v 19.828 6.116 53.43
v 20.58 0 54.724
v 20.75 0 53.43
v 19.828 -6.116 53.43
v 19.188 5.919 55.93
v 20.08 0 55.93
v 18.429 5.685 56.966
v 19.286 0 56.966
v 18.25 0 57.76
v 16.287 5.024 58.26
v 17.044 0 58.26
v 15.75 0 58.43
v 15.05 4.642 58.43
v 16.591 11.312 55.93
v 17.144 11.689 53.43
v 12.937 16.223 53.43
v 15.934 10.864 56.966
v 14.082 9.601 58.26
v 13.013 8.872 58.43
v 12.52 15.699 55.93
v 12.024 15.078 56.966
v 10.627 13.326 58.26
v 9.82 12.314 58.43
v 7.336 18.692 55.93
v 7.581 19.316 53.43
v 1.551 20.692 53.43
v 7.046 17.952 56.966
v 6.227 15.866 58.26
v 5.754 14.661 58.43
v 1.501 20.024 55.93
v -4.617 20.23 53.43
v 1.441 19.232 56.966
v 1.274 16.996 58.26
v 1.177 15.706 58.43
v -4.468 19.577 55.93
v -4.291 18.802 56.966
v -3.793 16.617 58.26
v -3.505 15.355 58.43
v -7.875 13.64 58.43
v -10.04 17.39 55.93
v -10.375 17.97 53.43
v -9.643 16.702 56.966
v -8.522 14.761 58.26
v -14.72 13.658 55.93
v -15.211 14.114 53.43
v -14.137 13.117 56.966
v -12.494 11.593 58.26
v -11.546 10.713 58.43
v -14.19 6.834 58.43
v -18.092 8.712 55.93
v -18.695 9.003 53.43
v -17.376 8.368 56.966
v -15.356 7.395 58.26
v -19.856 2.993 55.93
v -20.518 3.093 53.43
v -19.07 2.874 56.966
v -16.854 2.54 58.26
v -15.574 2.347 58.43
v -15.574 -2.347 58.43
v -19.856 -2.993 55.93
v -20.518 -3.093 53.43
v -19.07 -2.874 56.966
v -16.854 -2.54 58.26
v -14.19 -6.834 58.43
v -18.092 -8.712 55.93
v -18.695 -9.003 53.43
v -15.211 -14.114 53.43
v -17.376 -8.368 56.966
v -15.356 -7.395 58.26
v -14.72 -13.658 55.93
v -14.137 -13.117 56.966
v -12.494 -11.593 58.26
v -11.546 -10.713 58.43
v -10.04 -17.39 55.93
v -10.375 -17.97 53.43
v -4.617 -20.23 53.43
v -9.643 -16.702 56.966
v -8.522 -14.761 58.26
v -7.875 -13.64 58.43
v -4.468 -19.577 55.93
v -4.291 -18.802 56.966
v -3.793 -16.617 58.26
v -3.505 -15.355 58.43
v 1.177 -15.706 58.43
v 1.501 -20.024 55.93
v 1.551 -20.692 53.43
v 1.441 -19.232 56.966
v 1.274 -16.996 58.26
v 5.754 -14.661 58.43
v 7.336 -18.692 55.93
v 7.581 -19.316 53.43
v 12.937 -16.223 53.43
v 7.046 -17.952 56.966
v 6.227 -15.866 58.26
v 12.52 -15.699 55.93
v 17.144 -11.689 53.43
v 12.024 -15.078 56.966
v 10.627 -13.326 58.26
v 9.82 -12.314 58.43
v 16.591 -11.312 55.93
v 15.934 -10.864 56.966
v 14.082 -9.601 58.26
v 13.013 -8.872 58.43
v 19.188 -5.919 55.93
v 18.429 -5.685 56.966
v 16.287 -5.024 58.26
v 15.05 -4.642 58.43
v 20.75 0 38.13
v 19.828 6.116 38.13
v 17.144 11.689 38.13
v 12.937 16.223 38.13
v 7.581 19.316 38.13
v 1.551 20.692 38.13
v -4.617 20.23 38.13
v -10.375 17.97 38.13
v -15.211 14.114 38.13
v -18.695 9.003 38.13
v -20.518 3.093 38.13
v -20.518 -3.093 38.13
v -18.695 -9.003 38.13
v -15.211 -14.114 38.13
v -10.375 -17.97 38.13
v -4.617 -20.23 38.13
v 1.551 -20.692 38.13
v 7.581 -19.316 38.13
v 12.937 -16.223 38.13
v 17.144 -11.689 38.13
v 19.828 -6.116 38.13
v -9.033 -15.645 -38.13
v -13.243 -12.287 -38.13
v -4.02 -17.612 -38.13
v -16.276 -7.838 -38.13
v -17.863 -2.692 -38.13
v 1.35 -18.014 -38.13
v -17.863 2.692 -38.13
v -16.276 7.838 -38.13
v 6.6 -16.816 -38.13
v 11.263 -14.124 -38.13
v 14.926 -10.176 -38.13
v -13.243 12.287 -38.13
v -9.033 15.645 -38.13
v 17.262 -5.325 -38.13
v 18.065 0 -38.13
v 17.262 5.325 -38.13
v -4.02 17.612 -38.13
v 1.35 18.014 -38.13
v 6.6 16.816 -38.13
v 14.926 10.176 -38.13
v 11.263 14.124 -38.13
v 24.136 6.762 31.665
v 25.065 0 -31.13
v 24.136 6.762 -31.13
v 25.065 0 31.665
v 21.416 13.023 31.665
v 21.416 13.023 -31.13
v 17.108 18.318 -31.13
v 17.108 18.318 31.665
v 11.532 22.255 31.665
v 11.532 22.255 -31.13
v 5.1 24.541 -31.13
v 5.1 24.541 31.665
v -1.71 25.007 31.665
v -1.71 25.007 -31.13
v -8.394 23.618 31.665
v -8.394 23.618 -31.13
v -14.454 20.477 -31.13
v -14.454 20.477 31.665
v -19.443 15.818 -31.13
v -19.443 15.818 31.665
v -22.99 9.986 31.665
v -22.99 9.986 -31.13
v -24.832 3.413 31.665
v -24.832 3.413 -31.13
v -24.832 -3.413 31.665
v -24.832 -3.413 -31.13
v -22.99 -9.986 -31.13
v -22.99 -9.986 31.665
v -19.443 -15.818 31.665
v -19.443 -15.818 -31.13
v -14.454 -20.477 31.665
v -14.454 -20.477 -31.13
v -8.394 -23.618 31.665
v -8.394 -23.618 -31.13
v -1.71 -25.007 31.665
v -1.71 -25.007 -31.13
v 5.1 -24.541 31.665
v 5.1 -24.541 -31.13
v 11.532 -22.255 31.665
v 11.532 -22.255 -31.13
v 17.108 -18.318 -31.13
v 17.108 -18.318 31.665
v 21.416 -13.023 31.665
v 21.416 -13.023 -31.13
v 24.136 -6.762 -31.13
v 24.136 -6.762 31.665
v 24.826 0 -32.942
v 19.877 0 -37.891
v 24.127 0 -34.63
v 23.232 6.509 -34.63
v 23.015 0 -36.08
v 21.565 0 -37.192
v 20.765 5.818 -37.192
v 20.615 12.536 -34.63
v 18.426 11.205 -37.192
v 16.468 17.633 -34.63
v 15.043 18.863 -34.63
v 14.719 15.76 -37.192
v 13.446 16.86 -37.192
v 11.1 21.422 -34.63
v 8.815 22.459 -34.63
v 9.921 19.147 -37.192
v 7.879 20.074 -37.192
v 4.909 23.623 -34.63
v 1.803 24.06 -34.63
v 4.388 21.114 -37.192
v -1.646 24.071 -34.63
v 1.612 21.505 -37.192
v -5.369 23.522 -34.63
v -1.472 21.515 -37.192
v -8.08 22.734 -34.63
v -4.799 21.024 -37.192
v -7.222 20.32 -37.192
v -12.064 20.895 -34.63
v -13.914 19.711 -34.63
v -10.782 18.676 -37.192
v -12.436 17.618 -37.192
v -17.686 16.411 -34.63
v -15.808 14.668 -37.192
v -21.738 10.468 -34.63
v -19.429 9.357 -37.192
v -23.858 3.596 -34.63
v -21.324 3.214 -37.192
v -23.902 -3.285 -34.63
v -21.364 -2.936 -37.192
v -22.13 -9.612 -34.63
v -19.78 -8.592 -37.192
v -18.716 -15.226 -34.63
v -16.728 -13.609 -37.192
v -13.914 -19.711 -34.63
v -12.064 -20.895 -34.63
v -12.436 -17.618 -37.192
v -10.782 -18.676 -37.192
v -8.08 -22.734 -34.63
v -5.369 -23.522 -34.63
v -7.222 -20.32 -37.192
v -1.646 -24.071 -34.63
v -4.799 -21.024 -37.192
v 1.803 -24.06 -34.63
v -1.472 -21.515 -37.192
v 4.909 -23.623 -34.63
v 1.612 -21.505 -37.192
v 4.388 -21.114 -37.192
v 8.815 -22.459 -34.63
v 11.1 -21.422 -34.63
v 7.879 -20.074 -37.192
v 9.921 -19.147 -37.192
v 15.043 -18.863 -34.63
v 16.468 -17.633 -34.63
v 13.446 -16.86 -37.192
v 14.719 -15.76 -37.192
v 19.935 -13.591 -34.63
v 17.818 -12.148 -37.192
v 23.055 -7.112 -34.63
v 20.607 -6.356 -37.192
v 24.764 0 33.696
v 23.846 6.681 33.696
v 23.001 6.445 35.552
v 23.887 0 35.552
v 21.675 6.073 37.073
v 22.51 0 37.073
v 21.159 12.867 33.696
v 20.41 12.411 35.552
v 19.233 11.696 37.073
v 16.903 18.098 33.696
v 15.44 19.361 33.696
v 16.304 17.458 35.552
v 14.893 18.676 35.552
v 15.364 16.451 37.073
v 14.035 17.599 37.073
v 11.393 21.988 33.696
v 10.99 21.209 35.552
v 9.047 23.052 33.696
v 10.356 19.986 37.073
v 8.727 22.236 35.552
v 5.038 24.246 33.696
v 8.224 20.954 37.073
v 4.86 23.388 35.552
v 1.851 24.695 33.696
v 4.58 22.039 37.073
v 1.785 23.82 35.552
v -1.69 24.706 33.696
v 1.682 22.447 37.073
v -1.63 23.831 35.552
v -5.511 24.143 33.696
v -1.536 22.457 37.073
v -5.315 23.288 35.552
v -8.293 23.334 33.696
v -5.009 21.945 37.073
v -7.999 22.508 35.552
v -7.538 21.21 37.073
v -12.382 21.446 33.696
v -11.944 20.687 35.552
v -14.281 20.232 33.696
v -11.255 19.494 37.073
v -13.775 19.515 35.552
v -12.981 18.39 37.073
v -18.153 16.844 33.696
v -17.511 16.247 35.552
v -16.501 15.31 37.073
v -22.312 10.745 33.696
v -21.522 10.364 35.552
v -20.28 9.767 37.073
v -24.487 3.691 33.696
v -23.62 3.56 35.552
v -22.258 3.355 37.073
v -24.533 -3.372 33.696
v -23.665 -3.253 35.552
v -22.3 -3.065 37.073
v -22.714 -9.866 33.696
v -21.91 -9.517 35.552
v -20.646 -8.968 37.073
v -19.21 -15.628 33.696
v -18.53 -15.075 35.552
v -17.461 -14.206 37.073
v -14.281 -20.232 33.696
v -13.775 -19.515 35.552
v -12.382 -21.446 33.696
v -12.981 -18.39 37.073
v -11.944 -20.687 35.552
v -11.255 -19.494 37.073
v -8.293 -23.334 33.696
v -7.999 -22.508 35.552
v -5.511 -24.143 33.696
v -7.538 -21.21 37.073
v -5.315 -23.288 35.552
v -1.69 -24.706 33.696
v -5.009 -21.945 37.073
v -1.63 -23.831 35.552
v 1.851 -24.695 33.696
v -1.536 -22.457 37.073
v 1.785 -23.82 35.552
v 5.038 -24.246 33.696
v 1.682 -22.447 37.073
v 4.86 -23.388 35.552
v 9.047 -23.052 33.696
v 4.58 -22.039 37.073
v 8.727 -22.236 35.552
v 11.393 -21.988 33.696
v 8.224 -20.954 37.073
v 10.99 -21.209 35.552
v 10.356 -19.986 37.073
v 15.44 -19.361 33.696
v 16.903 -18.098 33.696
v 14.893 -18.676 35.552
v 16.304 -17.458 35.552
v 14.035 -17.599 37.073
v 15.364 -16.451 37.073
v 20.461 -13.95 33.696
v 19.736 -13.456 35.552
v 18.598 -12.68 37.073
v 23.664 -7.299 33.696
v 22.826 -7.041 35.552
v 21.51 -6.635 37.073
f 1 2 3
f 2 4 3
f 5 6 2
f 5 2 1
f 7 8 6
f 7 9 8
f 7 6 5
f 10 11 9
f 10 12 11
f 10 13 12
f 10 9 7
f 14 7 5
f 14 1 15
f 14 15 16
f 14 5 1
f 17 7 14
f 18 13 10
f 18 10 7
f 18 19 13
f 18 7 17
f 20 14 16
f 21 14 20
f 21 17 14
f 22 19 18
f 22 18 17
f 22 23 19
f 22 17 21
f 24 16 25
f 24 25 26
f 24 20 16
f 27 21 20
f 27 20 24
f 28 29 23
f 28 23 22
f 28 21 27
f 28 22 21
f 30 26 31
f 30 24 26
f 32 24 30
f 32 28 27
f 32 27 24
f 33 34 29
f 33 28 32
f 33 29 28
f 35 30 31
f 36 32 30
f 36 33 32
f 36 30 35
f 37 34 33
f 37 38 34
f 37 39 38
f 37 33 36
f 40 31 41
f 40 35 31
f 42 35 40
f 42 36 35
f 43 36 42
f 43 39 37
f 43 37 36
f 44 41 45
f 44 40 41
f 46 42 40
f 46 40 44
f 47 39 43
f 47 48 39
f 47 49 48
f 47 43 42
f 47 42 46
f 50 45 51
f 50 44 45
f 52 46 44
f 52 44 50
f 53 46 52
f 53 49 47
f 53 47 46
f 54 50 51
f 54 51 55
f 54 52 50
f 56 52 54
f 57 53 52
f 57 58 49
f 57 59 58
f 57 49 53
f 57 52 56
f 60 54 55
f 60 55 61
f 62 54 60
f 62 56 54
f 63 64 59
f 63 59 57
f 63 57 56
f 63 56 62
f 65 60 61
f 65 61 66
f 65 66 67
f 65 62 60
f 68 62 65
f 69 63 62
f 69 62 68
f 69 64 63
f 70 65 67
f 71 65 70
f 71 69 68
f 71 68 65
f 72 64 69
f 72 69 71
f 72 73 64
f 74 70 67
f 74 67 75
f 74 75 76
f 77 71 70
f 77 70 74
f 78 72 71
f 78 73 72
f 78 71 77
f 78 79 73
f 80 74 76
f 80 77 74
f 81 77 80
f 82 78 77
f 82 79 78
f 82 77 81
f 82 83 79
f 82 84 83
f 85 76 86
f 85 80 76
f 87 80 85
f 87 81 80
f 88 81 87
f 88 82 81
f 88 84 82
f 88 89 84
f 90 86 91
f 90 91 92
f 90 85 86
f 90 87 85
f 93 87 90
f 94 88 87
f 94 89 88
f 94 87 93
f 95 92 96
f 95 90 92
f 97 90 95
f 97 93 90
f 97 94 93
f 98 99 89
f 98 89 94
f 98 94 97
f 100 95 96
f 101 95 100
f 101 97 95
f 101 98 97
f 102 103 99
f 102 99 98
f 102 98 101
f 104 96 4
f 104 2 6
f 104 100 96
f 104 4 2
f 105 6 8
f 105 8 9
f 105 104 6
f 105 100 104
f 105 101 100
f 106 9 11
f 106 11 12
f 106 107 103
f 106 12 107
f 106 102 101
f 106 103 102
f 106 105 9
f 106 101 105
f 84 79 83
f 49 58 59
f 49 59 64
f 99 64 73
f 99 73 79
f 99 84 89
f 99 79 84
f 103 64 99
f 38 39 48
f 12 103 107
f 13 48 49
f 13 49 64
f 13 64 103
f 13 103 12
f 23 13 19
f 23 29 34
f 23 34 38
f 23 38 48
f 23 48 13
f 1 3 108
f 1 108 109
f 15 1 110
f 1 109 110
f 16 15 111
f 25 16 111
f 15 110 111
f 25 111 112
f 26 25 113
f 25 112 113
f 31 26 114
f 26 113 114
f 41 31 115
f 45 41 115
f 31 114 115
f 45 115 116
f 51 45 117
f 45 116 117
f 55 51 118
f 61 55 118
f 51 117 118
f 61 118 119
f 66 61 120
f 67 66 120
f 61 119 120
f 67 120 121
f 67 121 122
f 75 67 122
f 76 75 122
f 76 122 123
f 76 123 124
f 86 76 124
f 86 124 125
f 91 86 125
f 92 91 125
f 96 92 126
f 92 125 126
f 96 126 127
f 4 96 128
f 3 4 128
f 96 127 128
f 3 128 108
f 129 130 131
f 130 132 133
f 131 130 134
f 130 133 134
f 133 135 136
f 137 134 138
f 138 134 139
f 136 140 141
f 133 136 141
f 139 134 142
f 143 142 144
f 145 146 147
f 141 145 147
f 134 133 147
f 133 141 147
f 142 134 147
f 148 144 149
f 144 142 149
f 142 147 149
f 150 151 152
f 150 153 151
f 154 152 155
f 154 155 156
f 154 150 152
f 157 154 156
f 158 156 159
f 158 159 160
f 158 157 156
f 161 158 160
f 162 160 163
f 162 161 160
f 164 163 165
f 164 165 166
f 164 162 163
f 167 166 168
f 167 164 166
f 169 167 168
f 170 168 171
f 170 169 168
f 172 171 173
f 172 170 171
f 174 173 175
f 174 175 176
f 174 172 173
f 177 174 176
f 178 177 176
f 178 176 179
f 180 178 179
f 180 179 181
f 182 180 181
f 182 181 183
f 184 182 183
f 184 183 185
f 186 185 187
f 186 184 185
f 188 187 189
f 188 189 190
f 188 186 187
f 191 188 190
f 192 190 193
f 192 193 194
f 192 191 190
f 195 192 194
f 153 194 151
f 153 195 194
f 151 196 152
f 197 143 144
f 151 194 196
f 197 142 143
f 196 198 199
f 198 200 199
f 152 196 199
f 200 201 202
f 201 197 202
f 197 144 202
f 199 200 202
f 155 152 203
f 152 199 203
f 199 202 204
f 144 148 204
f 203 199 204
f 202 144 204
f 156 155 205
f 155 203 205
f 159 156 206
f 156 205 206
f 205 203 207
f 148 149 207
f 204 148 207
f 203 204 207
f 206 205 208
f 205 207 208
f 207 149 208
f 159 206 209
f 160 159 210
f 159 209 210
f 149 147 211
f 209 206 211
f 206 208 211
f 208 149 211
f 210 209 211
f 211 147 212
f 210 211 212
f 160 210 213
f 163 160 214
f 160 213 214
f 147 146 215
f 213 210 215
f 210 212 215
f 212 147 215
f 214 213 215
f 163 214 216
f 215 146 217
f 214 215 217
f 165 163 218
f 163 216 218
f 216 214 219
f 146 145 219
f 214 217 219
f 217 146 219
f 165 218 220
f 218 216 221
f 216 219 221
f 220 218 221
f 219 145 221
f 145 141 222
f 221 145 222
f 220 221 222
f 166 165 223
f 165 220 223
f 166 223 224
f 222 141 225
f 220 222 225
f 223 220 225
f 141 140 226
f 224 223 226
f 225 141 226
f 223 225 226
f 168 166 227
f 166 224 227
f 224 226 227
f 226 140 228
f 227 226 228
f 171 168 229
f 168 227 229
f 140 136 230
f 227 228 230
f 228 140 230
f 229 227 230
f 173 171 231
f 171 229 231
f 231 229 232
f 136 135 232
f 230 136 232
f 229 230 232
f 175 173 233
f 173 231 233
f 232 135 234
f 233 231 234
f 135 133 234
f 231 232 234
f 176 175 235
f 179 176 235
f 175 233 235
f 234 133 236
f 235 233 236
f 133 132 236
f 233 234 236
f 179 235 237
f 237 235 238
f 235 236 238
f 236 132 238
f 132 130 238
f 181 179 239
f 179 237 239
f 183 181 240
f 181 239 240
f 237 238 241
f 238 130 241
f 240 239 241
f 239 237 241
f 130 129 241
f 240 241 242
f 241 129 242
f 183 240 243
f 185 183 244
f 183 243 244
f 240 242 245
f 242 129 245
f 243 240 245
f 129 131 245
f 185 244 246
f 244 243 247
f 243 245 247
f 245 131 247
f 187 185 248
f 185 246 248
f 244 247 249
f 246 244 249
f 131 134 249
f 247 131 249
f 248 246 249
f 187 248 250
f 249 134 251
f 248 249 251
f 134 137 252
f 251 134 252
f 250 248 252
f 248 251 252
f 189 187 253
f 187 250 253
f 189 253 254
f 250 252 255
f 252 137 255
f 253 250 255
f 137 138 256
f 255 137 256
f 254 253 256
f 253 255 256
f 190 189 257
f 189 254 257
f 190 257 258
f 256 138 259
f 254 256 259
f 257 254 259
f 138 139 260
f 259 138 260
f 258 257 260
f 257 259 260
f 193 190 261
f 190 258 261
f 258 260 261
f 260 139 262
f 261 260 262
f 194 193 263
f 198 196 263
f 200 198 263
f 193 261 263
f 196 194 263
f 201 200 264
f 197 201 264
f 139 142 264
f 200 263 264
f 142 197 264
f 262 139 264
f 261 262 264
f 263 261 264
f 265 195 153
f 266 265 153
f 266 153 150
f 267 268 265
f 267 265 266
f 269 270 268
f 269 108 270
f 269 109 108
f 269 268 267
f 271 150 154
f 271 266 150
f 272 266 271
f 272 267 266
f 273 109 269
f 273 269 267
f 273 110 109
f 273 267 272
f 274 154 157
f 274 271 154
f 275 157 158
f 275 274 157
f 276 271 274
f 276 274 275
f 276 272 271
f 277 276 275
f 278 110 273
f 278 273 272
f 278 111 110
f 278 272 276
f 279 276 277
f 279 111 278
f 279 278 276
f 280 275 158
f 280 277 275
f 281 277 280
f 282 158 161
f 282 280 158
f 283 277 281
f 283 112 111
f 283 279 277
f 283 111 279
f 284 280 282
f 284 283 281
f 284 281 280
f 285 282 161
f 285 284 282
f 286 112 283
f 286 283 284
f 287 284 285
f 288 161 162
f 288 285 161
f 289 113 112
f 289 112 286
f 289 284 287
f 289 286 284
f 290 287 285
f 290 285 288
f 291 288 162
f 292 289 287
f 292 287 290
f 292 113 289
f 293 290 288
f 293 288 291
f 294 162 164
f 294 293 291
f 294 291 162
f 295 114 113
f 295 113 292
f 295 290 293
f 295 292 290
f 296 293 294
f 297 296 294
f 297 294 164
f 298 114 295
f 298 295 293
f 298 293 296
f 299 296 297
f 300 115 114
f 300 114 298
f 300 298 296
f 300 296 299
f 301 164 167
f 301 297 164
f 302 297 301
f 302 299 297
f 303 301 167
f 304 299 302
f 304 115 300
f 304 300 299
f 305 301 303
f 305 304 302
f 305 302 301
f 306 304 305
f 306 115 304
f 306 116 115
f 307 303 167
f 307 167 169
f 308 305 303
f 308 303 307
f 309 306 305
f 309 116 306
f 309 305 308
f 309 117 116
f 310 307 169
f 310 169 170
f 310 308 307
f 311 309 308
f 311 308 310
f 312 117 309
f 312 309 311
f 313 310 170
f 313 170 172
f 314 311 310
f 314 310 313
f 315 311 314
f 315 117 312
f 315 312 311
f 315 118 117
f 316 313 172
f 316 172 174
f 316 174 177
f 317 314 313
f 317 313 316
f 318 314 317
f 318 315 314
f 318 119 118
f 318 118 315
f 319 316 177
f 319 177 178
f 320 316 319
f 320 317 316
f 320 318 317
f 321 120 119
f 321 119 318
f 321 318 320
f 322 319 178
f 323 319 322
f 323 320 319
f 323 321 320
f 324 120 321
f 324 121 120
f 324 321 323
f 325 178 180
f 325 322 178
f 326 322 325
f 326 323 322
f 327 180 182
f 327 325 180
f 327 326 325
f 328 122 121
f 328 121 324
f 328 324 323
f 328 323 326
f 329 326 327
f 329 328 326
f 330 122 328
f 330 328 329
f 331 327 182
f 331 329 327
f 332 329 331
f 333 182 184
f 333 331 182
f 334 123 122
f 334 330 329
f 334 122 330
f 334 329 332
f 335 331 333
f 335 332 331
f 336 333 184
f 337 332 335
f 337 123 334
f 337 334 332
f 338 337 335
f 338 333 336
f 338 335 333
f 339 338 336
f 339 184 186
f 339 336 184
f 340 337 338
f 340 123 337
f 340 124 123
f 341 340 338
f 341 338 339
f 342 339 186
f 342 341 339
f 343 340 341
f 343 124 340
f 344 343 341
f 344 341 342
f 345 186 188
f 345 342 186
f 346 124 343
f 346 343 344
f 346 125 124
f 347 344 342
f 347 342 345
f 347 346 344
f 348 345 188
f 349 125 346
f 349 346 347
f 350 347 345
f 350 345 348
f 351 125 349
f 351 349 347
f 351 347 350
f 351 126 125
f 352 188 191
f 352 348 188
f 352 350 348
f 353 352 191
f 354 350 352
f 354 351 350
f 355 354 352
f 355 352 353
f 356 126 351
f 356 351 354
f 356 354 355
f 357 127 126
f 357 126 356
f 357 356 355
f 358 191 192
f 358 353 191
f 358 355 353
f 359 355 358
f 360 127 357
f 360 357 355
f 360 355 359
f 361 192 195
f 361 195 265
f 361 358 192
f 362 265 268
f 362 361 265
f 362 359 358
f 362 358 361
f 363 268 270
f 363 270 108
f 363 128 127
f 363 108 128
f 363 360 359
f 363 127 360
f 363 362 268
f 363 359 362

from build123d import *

# Parameters (mm, degrees)
F0_R     = 25.065
F1_DEPTH = 38.13
F2_R     = 20.75
F3_DEPTH = 20.3
F5_R     = 5


# Not quite as in the source:
# - a fillet or chamfer that OpenCascade refuses, or shapes differently, is made with other operations: its cross-section is extruded or revolved along the edge and cut away or added


with BuildPart() as f1:
    # F0 (on Top) → F1 (new body, symmetric)
    with BuildSketch(Plane.XY):
        Circle(F0_R)
    extrude(amount=F1_DEPTH, both=True)

    # F2 (on face) → F3 (join)
    with BuildSketch(Plane.XY.offset(38.13)):
        Circle(F2_R)
    extrude(amount=F3_DEPTH)

    # F4: fillet of radius 7 on 2 edges, made by hand

    # F4_s1 → F4_t2 (revolve, cut)
    with BuildSketch(Plane.XZ):
        with BuildLine():
            ThreePointArc((25.065, 31.6654215141), (23.8871559581, 35.5516150245), (20.75, 38.13))
            Line((20.75, 38.13), (25.065, 38.13))
            Line((25.065, 38.13), (25.065, 31.6654215141))
        make_face()
    revolve(axis=Axis((0, 0, 38.13), (0, 0, 1)), mode=Mode.SUBTRACT)

    # F4_s3 → F4_t4 (revolve, cut)
    with BuildSketch(Plane.XZ):
        with BuildLine():
            ThreePointArc((25.065, -31.13), (23.0147474683, -36.0797474683), (18.065, -38.13))
            Line((18.065, -38.13), (25.065, -38.13))
            Line((25.065, -38.13), (25.065, -31.13))
        make_face()
    revolve(axis=Axis((0, 0, -38.13), (0, 0, 1)), mode=Mode.SUBTRACT)

    # F5
    f5_edges = [f1.edges().sort_by_distance(p)[0] for p in [
        (-20.75, 0, 58.43),
    ]]
    fillet(f5_edges, radius=F5_R)


solid = f1.part
